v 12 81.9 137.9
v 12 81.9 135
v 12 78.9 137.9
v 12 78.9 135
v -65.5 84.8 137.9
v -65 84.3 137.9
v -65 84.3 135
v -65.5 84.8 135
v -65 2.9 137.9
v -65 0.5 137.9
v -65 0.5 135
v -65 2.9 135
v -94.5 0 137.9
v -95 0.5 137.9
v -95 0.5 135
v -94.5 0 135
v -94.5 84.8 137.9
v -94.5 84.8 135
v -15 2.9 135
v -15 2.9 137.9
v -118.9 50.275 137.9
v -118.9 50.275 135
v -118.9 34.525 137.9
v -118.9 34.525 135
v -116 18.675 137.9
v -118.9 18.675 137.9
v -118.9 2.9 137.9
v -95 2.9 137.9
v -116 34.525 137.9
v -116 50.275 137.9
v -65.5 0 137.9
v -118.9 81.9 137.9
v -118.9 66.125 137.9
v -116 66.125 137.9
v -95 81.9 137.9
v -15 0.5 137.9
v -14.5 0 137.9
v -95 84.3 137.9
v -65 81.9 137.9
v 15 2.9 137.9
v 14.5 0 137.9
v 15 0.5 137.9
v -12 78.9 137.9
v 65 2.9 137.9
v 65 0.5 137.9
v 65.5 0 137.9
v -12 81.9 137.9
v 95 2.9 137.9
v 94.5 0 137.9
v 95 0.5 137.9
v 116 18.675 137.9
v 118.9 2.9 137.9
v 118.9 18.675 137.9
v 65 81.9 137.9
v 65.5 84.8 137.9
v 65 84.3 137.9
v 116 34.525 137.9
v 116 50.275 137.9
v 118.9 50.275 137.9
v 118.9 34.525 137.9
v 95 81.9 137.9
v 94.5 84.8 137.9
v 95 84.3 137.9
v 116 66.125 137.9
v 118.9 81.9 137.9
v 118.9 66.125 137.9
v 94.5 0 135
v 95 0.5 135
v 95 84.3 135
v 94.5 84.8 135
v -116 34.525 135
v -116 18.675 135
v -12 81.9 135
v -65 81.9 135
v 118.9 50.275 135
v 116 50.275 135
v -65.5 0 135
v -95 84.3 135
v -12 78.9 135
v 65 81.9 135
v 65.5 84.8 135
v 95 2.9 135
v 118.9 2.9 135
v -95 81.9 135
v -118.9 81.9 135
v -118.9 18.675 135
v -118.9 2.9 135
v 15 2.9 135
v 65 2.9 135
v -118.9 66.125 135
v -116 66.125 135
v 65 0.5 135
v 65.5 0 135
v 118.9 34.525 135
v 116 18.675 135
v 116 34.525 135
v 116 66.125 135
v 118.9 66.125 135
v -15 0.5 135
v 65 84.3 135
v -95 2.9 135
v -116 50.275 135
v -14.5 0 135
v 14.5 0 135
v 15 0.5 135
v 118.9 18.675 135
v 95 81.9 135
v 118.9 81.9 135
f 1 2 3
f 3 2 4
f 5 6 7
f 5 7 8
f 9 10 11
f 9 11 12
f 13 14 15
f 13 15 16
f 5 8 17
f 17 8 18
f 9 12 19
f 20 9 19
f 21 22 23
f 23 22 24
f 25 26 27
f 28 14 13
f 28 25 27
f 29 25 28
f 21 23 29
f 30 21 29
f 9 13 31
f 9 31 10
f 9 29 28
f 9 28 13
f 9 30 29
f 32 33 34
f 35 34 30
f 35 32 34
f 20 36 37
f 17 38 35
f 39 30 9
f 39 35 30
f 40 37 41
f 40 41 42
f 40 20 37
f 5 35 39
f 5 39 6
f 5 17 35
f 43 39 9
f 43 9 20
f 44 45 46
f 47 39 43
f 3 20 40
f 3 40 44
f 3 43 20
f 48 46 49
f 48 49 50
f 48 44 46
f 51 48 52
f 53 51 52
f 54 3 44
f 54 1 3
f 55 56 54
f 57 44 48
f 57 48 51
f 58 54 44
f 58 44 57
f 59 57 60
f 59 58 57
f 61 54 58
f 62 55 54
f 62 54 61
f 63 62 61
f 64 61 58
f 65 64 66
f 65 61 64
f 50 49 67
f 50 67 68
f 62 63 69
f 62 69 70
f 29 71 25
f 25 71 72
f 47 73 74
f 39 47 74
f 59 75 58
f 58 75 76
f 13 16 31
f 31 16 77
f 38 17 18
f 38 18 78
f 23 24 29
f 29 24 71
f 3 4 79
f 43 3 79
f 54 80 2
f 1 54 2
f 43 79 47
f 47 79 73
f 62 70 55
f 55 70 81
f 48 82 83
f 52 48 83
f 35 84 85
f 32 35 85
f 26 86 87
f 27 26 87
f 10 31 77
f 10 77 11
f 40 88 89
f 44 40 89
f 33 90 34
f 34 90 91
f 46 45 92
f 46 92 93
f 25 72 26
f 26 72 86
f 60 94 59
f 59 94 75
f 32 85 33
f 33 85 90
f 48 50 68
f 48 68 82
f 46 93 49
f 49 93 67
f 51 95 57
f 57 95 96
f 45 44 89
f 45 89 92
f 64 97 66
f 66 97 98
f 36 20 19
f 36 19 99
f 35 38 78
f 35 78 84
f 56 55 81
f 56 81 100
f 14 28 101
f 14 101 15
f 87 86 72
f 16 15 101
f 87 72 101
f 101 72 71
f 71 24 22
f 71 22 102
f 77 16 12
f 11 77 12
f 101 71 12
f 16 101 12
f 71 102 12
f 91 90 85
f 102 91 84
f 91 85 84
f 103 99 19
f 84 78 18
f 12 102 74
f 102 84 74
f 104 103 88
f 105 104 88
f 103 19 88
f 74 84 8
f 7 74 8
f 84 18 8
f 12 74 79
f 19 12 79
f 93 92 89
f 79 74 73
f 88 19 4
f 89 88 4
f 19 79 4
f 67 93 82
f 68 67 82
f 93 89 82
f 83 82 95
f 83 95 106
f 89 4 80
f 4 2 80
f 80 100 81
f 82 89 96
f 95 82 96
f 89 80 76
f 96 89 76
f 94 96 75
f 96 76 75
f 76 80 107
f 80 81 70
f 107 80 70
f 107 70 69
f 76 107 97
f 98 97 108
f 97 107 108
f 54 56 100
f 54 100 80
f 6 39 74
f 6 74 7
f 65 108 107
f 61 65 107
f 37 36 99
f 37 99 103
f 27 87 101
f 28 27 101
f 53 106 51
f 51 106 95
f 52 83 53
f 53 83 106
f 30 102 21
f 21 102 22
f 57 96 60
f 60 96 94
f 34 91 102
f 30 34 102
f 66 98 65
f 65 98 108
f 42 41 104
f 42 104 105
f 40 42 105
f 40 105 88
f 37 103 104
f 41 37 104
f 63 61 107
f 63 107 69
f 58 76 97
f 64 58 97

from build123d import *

# Parameters (mm, degrees)
BOSS_EXTRUDE1_DEPTH = 2.9


with BuildPart() as part:
    # Sketch1 → Boss-Extrude1 (new body)
    with BuildSketch(Plane.XY.offset(135)):
        Polygon((-118.9, 2.9), (-95, 2.9), (-95, 0.5), (-94.5, 0), (-65.5, 0), (-65, 0.5), (-65, 2.9), (-15, 2.9), (-15, 0.5), (-14.5, 0), (14.5, 0), (15, 0.5), (15, 2.9), (65, 2.9), (65, 0.5), (65.5, 0), (94.5, 0), (95, 0.5), (95, 2.9), (118.9, 2.9), (118.9, 18.675), (116, 18.675), (116, 34.525), (118.9, 34.525), (118.9, 50.275), (116, 50.275), (116, 66.125), (118.9, 66.125), (118.9, 81.9), (95, 81.9), (95, 84.3), (94.5, 84.8), (65.5, 84.8), (65, 84.3), (65, 81.9), (12, 81.9), (12, 78.9), (-12, 78.9), (-12, 81.9), (-65, 81.9), (-65, 84.3), (-65.5, 84.8), (-94.5, 84.8), (-95, 84.3), (-95, 81.9), (-118.9, 81.9), (-118.9, 66.125), (-116, 66.125), (-116, 50.275), (-118.9, 50.275), (-118.9, 34.525), (-116, 34.525), (-116, 18.675), (-118.9, 18.675), align=None)
    extrude(amount=BOSS_EXTRUDE1_DEPTH)


solid = part.part
